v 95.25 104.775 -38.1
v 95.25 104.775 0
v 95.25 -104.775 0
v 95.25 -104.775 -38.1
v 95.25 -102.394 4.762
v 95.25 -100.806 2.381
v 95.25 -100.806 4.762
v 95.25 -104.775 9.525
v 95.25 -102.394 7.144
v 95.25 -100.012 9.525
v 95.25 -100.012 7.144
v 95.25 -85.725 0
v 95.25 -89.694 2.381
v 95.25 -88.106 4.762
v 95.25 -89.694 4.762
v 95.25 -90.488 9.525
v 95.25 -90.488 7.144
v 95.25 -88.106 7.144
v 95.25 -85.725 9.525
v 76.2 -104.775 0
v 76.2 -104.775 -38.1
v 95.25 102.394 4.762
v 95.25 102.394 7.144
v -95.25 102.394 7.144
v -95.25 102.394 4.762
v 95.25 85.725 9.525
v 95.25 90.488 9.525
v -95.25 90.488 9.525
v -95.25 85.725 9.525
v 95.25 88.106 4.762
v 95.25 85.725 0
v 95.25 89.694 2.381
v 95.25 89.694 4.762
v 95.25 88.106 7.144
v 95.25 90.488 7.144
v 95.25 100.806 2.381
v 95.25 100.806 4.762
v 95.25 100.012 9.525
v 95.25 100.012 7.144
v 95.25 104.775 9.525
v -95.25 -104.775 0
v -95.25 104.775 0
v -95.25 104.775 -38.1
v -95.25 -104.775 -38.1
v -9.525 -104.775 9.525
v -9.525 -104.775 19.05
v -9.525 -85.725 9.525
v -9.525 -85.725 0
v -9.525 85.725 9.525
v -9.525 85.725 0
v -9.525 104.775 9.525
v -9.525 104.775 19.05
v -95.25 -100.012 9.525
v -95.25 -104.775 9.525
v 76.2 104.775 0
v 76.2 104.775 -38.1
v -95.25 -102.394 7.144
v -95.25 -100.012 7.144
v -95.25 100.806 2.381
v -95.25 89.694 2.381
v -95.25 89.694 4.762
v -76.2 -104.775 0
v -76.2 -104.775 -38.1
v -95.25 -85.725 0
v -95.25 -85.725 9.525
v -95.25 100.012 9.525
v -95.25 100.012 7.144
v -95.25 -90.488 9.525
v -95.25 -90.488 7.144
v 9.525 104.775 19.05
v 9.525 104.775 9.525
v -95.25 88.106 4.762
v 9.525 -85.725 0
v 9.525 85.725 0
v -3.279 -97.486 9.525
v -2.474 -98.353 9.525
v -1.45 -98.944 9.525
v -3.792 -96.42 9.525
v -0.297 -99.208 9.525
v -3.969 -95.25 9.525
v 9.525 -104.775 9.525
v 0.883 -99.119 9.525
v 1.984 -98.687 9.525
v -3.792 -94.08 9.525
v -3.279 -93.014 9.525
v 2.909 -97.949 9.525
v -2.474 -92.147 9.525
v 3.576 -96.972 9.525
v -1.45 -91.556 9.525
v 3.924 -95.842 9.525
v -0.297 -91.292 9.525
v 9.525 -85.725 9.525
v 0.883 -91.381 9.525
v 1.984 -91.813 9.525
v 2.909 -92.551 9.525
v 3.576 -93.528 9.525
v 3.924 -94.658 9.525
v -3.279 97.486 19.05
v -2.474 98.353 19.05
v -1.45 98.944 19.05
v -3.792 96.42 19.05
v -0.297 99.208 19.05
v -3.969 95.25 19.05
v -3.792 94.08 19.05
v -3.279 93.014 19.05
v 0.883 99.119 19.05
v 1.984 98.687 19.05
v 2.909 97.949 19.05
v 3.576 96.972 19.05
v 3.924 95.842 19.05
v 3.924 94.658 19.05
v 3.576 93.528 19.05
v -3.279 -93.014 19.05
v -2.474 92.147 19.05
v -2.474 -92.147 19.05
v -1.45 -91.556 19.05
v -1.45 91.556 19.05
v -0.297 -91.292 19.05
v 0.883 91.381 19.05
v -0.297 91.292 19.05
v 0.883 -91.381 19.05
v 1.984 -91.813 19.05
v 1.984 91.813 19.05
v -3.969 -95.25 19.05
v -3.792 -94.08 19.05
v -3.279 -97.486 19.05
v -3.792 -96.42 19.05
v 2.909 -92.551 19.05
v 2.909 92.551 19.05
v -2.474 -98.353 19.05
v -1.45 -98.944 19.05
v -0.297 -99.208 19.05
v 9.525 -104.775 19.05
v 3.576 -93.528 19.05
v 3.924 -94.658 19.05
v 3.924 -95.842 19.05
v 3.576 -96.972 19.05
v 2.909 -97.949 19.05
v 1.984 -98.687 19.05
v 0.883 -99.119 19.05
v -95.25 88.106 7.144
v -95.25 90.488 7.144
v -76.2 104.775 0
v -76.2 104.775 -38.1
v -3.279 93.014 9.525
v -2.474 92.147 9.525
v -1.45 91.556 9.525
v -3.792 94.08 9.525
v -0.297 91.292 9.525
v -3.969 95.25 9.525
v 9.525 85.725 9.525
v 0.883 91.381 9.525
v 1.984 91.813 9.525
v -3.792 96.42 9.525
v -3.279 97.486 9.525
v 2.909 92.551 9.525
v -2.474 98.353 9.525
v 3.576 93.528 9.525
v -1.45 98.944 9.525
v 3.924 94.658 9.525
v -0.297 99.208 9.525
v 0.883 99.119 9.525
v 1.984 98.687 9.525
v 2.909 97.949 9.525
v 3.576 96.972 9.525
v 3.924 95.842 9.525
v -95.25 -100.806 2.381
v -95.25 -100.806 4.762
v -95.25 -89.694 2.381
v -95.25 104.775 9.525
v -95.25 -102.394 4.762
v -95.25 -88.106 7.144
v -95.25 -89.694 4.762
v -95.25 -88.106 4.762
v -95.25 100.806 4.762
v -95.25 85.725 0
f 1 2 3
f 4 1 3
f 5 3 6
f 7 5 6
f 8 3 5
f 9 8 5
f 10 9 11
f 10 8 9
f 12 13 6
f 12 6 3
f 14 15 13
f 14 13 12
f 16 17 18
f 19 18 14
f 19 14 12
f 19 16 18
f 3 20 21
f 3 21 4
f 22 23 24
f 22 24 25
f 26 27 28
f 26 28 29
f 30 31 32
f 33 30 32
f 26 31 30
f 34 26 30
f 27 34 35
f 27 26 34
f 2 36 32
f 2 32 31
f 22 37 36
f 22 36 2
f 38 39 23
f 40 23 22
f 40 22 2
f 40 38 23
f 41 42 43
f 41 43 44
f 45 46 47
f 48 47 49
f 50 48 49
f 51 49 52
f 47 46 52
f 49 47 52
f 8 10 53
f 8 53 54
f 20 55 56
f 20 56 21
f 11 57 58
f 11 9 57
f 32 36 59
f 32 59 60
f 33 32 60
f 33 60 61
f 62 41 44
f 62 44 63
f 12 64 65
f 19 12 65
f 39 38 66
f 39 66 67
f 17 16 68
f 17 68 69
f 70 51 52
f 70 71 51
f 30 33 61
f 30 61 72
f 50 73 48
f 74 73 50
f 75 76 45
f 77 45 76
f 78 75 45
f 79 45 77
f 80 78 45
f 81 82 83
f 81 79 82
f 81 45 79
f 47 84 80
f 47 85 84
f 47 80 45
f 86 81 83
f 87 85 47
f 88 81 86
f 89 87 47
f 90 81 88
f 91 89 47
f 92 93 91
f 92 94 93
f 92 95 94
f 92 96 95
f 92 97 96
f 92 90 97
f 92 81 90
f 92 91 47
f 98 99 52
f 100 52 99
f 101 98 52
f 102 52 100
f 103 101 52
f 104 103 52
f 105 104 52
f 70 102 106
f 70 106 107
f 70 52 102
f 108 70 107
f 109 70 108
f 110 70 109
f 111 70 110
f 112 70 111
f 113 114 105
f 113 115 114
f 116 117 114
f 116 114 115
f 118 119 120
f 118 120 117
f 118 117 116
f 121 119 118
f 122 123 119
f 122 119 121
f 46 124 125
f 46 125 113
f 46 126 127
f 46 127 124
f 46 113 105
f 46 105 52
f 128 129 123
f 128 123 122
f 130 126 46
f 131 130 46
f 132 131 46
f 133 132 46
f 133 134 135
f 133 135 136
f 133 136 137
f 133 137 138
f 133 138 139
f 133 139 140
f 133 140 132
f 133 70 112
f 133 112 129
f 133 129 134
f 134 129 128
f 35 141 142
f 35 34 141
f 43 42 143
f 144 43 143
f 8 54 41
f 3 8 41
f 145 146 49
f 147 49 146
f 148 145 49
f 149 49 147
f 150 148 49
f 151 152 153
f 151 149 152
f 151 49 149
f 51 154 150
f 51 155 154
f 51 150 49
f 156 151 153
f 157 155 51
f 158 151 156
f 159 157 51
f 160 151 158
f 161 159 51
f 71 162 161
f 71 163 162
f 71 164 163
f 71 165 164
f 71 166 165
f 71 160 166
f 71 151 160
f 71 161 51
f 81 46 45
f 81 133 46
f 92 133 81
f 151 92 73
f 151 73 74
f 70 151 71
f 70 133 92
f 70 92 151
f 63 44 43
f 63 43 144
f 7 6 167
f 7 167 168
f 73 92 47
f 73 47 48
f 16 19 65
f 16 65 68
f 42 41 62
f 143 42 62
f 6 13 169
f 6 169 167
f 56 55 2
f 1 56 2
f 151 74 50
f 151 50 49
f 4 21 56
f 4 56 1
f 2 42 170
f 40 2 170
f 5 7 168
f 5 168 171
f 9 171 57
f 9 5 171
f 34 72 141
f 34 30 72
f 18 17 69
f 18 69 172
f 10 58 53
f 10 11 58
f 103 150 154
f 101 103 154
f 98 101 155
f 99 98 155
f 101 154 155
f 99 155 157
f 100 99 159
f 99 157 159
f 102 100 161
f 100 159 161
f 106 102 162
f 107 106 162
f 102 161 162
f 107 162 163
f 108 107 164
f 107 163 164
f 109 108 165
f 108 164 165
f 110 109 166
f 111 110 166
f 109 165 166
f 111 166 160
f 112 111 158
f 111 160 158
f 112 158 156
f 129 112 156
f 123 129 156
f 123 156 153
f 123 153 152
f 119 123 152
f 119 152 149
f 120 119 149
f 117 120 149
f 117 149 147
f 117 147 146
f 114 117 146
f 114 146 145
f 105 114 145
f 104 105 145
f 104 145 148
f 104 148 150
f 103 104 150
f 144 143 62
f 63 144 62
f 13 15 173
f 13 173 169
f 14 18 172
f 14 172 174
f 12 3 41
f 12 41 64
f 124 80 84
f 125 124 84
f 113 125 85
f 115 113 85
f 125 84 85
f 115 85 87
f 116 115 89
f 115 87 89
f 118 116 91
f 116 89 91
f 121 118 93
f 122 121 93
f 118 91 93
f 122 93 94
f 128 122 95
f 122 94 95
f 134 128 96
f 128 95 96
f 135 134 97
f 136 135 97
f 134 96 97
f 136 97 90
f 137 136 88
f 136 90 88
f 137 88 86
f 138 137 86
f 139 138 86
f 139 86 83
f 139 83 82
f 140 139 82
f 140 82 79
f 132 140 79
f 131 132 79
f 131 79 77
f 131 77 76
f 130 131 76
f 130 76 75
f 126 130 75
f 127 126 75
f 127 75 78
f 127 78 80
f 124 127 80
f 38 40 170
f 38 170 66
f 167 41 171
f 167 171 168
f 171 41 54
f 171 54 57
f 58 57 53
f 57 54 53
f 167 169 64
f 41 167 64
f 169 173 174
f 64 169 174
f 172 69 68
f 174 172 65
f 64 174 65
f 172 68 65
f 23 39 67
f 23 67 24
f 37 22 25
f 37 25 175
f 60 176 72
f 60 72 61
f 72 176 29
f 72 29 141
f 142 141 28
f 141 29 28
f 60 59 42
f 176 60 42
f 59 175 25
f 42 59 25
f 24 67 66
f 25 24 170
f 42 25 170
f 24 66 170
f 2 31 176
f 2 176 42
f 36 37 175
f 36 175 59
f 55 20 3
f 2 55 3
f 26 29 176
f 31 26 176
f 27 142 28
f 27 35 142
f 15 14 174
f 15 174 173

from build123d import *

# Parameters (mm, degrees)
F3_DEPTH = 95.25
F1_W     = 19.05
F1_H     = 209.55
F4_DEPTH = 38.1
F5_DEPTH = 9.525
F7_D     = 7.9375


with BuildPart() as f3:
    # F0 (on Right) → F3 (new body, symmetric)
    with BuildSketch(Plane.YZ):
        Polygon((-100.0125, 7.14375), (-100.0125, 9.525), (-104.775, 9.525), (-104.775, 0), (-85.725, 0), (-85.725, 9.525), (-90.4875, 9.525), (-90.4875, 7.14375), (-88.10625, 7.14375), (-88.10625, 4.7625), (-89.69375, 4.7625), (-89.69375, 2.38125), (-100.80625, 2.38125), (-100.80625, 4.7625), (-102.39375, 4.7625), (-102.39375, 7.14375), align=None)
    extrude(amount=F3_DEPTH, both=True)


with BuildPart() as f3b:
    # F0 (on Right) → F3, piece 2 (new body, symmetric)
    with BuildSketch(Plane.YZ):
        Polygon((90.4875, 7.14375), (90.4875, 9.525), (85.725, 9.525), (85.725, 0), (104.775, 0), (104.775, 9.525), (100.0125, 9.525), (100.0125, 7.14375), (102.39375, 7.14375), (102.39375, 4.7625), (100.80625, 4.7625), (100.80625, 2.38125), (89.69375, 2.38125), (89.69375, 4.7625), (88.10625, 4.7625), (88.10625, 7.14375), align=None)
    extrude(amount=F3_DEPTH, both=True)


with BuildPart() as f4:
    # F1 (on face) → F4 (new body)
    with BuildSketch(Plane(origin=(0, 0, 0), x_dir=(1, 0, 0), z_dir=(0, 0, -1))):
        with Locations((-85.725, 0)):
            Rectangle(F1_W, F1_H)
    extrude(amount=F4_DEPTH)


with BuildPart() as f4b:
    # F1 (on face) → F4, piece 2 (new body)
    with BuildSketch(Plane(origin=(0, 0, 0), x_dir=(1, 0, 0), z_dir=(0, 0, -1))):
        with Locations((85.725, 0)):
            Rectangle(F1_W, F1_H)
    extrude(amount=F4_DEPTH)


with BuildPart() as f5:
    # F2 (on Right) → F5 (new body, symmetric)
    with BuildSketch(Plane.YZ):
        Polygon((-104.775, 19.05), (-104.775, 9.525), (-85.725, 9.525), (-85.725, 0), (85.725, 0), (85.725, 9.525), (104.775, 9.525), (104.775, 19.05), align=None)
    extrude(amount=F5_DEPTH, both=True)

    # F7 (through all)
    with Locations(Plane.XY.offset(19.05)):
        with Locations((0, -95.25), (0, 95.25)):
            Hole(F7_D / 2)


solid = Compound([f3.part, f3b.part, f4.part, f4b.part, f5.part])
